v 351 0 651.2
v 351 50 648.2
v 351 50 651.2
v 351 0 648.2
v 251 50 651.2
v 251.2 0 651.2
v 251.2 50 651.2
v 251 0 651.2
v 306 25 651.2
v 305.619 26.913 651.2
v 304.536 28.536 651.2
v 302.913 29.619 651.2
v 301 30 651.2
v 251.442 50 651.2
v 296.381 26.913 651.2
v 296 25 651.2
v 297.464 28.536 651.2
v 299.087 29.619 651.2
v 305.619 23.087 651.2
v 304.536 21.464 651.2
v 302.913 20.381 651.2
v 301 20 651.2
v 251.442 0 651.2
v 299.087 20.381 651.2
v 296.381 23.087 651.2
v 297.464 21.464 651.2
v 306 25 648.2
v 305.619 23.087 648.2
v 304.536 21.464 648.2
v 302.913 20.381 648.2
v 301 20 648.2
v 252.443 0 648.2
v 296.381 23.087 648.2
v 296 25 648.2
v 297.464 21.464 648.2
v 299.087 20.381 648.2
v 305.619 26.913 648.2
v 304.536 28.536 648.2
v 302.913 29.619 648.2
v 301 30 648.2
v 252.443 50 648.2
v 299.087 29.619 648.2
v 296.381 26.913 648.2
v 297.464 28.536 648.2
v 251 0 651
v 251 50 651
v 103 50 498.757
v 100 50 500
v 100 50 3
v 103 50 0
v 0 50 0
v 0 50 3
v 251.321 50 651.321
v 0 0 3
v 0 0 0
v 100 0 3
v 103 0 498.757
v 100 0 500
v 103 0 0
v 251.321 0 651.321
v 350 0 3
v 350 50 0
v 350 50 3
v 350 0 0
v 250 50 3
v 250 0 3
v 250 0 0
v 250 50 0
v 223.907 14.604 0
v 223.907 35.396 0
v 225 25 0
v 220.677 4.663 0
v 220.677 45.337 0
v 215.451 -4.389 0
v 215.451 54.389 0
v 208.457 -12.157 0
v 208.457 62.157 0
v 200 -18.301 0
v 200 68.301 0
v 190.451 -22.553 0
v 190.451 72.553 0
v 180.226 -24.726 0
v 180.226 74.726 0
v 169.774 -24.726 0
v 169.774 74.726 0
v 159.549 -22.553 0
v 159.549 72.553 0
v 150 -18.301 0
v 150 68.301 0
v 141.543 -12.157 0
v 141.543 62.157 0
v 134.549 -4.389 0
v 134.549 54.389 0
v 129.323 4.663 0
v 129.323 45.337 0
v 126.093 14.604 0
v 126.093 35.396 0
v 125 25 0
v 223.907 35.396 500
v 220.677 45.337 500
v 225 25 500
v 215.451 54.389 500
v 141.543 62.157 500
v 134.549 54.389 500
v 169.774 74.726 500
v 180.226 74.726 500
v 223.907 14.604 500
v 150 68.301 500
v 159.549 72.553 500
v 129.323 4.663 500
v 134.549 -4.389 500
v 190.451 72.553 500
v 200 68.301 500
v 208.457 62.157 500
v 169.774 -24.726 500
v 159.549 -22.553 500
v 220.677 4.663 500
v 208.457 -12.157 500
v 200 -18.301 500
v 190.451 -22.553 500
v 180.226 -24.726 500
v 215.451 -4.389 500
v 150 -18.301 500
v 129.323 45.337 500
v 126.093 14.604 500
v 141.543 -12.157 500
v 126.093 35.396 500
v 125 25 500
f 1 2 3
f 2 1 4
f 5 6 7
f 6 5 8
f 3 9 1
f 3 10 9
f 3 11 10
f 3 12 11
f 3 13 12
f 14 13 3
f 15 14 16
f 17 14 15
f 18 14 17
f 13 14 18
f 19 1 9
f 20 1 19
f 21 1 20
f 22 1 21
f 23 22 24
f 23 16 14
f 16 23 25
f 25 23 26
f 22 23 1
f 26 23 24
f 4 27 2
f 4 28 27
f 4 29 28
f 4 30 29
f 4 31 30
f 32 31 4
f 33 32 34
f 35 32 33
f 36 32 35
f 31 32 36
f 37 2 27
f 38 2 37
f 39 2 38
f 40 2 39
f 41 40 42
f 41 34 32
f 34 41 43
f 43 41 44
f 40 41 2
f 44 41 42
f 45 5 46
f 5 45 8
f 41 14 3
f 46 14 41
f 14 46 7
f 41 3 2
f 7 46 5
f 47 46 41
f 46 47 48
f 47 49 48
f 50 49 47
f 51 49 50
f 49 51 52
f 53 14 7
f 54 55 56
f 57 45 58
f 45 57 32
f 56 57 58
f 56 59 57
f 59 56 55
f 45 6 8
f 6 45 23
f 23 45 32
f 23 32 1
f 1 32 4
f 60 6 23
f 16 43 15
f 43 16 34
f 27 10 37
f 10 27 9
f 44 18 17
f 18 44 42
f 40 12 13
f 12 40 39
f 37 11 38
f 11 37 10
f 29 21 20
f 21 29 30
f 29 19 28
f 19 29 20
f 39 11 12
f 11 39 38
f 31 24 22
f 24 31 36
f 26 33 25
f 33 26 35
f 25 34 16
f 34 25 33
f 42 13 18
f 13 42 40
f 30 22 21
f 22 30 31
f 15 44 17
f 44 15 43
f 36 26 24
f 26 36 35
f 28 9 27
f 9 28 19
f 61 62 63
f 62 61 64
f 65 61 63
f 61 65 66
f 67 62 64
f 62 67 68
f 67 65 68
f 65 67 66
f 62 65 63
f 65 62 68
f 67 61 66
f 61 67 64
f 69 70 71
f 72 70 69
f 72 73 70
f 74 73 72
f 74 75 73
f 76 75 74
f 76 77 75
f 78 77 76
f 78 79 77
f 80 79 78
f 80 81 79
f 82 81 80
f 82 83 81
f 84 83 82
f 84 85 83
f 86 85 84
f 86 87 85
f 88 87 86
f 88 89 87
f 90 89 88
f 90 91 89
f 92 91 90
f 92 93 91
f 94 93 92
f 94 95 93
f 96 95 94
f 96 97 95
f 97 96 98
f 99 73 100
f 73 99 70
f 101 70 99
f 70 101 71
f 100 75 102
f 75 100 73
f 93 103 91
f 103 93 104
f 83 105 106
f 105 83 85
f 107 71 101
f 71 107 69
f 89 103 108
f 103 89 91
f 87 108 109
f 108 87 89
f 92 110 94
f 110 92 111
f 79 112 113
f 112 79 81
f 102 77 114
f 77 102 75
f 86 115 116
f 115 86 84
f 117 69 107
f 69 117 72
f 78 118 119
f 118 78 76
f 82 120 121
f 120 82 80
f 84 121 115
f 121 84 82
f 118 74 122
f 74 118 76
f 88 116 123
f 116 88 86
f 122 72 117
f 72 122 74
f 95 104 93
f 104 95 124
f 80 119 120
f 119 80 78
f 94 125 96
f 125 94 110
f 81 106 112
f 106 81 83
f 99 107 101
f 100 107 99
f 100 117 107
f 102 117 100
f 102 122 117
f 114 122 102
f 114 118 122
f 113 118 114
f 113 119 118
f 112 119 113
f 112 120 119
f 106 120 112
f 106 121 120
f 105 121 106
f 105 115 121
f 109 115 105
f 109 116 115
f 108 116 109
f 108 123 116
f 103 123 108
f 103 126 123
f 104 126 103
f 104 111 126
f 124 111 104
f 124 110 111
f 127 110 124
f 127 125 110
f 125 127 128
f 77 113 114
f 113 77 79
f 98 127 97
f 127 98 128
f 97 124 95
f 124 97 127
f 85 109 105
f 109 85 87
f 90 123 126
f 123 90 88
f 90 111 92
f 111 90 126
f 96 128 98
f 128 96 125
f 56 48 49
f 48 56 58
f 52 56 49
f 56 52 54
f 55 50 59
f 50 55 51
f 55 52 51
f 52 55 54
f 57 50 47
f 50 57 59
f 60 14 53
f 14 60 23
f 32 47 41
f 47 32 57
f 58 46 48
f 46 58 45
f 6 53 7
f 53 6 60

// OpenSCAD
// variables en mm
epaisseur = 3;
largeur = 50;
// cylindre intérieur
translate([175,25,0])
    cylinder(500,50,50,false);
// premiere branche
cube([100,largeur,epaisseur],[0,0,0]);
translate([100,0,0])
    cube([epaisseur,largeur,500]);
translate([100,0,0])
    translate([0,0,500])
        rotate([0,45,0])    
            cube([epaisseur,largeur,214]);
translate([0,0,648.2])
    translate([251,0,0])
        rotate([0,0,0])
            difference()
            {
                cube([100,largeur,epaisseur]);
                translate([50,largeur/2,-epaisseur])
                    cylinder(4*epaisseur, 5,5);
            };

/*
translate([0,0,776])
    translate([315,0,0])
        polyhedron(
            points = [
            [0,0,0],     //0
            [epaisseur,0,0,],    //1
            [epaisseur,largeur,0],   //2
            [0,largeur,0],   //3
            [0,0.75 * largeur,65],   //4
            [epaisseur,0.75 * largeur,65] ,  //5
            ],
            faces = [
            [4,0,3],
            [0,4,5,1],
            [0,1,2,3],
            [3,2,4,5],
            [1,5,2]
            ]
        );
 */
 // seconde branche
 translate([250,0,0])
    {
        cube([100,largeur,epaisseur],[0,0,0]);
        polyhedron(
        points = [
        [ 0,0,0 ], //0
        [ epaisseur,0,0 ], //1
        [ epaisseur,largeur,0 ], //2
        [ 0,largeur,0 ], //3
        [ 0,0,650], //4
        [ epaisseur,0,650 ], //5
        [ epaisseur,largeur,650 ], //6
        [ 0,largeur,650 ], //7
        ],
        faces = [
        [ 0,3,7,4 ] ,
        [ 0,1,2,3 ] ,
        [ 3,2,6,7 ] ,
        [ 7,6,5,4 ] ,
        [ 4,5,1,0 ] ,
        [ 1,2,6,5 ] ,
        ]
        );
        //echo(atan(70/largeur));
        //translate([0,0,500])
            //rotate([ 0,-45,0])
                //rotate([0,0,-atan(70/largeur)])
                    /*
                    polyhedron(
                    points = [
                    [ 0,0,500 ] , // 0
                    [ epaisseur,0,500 ] , // 1
                    [ epaisseur,largeur,570 ] , // 2
                    [ 0,largeur,570 ] , // 3
                    [ -105,0, 600] , // 4
                    [ -105+epaisseur, 0, 600 ] , // 5
                    [ -85+epaisseur, largeur, 670] , // 6
                    [ -85, largeur, 670 ] , // 7
                    ] ,
                    faces = [
                    [ 0,3,7,4 ] ,
                    [ 0,1,2,3 ] ,
                    [ 3,2,6,7 ] ,
                    [ 7,6,5,4 ] ,
                    [ 4,5,1,0 ] ,
                    [ 1,2,6,5 ] ,
                    ]
                    );
                    */
    }
